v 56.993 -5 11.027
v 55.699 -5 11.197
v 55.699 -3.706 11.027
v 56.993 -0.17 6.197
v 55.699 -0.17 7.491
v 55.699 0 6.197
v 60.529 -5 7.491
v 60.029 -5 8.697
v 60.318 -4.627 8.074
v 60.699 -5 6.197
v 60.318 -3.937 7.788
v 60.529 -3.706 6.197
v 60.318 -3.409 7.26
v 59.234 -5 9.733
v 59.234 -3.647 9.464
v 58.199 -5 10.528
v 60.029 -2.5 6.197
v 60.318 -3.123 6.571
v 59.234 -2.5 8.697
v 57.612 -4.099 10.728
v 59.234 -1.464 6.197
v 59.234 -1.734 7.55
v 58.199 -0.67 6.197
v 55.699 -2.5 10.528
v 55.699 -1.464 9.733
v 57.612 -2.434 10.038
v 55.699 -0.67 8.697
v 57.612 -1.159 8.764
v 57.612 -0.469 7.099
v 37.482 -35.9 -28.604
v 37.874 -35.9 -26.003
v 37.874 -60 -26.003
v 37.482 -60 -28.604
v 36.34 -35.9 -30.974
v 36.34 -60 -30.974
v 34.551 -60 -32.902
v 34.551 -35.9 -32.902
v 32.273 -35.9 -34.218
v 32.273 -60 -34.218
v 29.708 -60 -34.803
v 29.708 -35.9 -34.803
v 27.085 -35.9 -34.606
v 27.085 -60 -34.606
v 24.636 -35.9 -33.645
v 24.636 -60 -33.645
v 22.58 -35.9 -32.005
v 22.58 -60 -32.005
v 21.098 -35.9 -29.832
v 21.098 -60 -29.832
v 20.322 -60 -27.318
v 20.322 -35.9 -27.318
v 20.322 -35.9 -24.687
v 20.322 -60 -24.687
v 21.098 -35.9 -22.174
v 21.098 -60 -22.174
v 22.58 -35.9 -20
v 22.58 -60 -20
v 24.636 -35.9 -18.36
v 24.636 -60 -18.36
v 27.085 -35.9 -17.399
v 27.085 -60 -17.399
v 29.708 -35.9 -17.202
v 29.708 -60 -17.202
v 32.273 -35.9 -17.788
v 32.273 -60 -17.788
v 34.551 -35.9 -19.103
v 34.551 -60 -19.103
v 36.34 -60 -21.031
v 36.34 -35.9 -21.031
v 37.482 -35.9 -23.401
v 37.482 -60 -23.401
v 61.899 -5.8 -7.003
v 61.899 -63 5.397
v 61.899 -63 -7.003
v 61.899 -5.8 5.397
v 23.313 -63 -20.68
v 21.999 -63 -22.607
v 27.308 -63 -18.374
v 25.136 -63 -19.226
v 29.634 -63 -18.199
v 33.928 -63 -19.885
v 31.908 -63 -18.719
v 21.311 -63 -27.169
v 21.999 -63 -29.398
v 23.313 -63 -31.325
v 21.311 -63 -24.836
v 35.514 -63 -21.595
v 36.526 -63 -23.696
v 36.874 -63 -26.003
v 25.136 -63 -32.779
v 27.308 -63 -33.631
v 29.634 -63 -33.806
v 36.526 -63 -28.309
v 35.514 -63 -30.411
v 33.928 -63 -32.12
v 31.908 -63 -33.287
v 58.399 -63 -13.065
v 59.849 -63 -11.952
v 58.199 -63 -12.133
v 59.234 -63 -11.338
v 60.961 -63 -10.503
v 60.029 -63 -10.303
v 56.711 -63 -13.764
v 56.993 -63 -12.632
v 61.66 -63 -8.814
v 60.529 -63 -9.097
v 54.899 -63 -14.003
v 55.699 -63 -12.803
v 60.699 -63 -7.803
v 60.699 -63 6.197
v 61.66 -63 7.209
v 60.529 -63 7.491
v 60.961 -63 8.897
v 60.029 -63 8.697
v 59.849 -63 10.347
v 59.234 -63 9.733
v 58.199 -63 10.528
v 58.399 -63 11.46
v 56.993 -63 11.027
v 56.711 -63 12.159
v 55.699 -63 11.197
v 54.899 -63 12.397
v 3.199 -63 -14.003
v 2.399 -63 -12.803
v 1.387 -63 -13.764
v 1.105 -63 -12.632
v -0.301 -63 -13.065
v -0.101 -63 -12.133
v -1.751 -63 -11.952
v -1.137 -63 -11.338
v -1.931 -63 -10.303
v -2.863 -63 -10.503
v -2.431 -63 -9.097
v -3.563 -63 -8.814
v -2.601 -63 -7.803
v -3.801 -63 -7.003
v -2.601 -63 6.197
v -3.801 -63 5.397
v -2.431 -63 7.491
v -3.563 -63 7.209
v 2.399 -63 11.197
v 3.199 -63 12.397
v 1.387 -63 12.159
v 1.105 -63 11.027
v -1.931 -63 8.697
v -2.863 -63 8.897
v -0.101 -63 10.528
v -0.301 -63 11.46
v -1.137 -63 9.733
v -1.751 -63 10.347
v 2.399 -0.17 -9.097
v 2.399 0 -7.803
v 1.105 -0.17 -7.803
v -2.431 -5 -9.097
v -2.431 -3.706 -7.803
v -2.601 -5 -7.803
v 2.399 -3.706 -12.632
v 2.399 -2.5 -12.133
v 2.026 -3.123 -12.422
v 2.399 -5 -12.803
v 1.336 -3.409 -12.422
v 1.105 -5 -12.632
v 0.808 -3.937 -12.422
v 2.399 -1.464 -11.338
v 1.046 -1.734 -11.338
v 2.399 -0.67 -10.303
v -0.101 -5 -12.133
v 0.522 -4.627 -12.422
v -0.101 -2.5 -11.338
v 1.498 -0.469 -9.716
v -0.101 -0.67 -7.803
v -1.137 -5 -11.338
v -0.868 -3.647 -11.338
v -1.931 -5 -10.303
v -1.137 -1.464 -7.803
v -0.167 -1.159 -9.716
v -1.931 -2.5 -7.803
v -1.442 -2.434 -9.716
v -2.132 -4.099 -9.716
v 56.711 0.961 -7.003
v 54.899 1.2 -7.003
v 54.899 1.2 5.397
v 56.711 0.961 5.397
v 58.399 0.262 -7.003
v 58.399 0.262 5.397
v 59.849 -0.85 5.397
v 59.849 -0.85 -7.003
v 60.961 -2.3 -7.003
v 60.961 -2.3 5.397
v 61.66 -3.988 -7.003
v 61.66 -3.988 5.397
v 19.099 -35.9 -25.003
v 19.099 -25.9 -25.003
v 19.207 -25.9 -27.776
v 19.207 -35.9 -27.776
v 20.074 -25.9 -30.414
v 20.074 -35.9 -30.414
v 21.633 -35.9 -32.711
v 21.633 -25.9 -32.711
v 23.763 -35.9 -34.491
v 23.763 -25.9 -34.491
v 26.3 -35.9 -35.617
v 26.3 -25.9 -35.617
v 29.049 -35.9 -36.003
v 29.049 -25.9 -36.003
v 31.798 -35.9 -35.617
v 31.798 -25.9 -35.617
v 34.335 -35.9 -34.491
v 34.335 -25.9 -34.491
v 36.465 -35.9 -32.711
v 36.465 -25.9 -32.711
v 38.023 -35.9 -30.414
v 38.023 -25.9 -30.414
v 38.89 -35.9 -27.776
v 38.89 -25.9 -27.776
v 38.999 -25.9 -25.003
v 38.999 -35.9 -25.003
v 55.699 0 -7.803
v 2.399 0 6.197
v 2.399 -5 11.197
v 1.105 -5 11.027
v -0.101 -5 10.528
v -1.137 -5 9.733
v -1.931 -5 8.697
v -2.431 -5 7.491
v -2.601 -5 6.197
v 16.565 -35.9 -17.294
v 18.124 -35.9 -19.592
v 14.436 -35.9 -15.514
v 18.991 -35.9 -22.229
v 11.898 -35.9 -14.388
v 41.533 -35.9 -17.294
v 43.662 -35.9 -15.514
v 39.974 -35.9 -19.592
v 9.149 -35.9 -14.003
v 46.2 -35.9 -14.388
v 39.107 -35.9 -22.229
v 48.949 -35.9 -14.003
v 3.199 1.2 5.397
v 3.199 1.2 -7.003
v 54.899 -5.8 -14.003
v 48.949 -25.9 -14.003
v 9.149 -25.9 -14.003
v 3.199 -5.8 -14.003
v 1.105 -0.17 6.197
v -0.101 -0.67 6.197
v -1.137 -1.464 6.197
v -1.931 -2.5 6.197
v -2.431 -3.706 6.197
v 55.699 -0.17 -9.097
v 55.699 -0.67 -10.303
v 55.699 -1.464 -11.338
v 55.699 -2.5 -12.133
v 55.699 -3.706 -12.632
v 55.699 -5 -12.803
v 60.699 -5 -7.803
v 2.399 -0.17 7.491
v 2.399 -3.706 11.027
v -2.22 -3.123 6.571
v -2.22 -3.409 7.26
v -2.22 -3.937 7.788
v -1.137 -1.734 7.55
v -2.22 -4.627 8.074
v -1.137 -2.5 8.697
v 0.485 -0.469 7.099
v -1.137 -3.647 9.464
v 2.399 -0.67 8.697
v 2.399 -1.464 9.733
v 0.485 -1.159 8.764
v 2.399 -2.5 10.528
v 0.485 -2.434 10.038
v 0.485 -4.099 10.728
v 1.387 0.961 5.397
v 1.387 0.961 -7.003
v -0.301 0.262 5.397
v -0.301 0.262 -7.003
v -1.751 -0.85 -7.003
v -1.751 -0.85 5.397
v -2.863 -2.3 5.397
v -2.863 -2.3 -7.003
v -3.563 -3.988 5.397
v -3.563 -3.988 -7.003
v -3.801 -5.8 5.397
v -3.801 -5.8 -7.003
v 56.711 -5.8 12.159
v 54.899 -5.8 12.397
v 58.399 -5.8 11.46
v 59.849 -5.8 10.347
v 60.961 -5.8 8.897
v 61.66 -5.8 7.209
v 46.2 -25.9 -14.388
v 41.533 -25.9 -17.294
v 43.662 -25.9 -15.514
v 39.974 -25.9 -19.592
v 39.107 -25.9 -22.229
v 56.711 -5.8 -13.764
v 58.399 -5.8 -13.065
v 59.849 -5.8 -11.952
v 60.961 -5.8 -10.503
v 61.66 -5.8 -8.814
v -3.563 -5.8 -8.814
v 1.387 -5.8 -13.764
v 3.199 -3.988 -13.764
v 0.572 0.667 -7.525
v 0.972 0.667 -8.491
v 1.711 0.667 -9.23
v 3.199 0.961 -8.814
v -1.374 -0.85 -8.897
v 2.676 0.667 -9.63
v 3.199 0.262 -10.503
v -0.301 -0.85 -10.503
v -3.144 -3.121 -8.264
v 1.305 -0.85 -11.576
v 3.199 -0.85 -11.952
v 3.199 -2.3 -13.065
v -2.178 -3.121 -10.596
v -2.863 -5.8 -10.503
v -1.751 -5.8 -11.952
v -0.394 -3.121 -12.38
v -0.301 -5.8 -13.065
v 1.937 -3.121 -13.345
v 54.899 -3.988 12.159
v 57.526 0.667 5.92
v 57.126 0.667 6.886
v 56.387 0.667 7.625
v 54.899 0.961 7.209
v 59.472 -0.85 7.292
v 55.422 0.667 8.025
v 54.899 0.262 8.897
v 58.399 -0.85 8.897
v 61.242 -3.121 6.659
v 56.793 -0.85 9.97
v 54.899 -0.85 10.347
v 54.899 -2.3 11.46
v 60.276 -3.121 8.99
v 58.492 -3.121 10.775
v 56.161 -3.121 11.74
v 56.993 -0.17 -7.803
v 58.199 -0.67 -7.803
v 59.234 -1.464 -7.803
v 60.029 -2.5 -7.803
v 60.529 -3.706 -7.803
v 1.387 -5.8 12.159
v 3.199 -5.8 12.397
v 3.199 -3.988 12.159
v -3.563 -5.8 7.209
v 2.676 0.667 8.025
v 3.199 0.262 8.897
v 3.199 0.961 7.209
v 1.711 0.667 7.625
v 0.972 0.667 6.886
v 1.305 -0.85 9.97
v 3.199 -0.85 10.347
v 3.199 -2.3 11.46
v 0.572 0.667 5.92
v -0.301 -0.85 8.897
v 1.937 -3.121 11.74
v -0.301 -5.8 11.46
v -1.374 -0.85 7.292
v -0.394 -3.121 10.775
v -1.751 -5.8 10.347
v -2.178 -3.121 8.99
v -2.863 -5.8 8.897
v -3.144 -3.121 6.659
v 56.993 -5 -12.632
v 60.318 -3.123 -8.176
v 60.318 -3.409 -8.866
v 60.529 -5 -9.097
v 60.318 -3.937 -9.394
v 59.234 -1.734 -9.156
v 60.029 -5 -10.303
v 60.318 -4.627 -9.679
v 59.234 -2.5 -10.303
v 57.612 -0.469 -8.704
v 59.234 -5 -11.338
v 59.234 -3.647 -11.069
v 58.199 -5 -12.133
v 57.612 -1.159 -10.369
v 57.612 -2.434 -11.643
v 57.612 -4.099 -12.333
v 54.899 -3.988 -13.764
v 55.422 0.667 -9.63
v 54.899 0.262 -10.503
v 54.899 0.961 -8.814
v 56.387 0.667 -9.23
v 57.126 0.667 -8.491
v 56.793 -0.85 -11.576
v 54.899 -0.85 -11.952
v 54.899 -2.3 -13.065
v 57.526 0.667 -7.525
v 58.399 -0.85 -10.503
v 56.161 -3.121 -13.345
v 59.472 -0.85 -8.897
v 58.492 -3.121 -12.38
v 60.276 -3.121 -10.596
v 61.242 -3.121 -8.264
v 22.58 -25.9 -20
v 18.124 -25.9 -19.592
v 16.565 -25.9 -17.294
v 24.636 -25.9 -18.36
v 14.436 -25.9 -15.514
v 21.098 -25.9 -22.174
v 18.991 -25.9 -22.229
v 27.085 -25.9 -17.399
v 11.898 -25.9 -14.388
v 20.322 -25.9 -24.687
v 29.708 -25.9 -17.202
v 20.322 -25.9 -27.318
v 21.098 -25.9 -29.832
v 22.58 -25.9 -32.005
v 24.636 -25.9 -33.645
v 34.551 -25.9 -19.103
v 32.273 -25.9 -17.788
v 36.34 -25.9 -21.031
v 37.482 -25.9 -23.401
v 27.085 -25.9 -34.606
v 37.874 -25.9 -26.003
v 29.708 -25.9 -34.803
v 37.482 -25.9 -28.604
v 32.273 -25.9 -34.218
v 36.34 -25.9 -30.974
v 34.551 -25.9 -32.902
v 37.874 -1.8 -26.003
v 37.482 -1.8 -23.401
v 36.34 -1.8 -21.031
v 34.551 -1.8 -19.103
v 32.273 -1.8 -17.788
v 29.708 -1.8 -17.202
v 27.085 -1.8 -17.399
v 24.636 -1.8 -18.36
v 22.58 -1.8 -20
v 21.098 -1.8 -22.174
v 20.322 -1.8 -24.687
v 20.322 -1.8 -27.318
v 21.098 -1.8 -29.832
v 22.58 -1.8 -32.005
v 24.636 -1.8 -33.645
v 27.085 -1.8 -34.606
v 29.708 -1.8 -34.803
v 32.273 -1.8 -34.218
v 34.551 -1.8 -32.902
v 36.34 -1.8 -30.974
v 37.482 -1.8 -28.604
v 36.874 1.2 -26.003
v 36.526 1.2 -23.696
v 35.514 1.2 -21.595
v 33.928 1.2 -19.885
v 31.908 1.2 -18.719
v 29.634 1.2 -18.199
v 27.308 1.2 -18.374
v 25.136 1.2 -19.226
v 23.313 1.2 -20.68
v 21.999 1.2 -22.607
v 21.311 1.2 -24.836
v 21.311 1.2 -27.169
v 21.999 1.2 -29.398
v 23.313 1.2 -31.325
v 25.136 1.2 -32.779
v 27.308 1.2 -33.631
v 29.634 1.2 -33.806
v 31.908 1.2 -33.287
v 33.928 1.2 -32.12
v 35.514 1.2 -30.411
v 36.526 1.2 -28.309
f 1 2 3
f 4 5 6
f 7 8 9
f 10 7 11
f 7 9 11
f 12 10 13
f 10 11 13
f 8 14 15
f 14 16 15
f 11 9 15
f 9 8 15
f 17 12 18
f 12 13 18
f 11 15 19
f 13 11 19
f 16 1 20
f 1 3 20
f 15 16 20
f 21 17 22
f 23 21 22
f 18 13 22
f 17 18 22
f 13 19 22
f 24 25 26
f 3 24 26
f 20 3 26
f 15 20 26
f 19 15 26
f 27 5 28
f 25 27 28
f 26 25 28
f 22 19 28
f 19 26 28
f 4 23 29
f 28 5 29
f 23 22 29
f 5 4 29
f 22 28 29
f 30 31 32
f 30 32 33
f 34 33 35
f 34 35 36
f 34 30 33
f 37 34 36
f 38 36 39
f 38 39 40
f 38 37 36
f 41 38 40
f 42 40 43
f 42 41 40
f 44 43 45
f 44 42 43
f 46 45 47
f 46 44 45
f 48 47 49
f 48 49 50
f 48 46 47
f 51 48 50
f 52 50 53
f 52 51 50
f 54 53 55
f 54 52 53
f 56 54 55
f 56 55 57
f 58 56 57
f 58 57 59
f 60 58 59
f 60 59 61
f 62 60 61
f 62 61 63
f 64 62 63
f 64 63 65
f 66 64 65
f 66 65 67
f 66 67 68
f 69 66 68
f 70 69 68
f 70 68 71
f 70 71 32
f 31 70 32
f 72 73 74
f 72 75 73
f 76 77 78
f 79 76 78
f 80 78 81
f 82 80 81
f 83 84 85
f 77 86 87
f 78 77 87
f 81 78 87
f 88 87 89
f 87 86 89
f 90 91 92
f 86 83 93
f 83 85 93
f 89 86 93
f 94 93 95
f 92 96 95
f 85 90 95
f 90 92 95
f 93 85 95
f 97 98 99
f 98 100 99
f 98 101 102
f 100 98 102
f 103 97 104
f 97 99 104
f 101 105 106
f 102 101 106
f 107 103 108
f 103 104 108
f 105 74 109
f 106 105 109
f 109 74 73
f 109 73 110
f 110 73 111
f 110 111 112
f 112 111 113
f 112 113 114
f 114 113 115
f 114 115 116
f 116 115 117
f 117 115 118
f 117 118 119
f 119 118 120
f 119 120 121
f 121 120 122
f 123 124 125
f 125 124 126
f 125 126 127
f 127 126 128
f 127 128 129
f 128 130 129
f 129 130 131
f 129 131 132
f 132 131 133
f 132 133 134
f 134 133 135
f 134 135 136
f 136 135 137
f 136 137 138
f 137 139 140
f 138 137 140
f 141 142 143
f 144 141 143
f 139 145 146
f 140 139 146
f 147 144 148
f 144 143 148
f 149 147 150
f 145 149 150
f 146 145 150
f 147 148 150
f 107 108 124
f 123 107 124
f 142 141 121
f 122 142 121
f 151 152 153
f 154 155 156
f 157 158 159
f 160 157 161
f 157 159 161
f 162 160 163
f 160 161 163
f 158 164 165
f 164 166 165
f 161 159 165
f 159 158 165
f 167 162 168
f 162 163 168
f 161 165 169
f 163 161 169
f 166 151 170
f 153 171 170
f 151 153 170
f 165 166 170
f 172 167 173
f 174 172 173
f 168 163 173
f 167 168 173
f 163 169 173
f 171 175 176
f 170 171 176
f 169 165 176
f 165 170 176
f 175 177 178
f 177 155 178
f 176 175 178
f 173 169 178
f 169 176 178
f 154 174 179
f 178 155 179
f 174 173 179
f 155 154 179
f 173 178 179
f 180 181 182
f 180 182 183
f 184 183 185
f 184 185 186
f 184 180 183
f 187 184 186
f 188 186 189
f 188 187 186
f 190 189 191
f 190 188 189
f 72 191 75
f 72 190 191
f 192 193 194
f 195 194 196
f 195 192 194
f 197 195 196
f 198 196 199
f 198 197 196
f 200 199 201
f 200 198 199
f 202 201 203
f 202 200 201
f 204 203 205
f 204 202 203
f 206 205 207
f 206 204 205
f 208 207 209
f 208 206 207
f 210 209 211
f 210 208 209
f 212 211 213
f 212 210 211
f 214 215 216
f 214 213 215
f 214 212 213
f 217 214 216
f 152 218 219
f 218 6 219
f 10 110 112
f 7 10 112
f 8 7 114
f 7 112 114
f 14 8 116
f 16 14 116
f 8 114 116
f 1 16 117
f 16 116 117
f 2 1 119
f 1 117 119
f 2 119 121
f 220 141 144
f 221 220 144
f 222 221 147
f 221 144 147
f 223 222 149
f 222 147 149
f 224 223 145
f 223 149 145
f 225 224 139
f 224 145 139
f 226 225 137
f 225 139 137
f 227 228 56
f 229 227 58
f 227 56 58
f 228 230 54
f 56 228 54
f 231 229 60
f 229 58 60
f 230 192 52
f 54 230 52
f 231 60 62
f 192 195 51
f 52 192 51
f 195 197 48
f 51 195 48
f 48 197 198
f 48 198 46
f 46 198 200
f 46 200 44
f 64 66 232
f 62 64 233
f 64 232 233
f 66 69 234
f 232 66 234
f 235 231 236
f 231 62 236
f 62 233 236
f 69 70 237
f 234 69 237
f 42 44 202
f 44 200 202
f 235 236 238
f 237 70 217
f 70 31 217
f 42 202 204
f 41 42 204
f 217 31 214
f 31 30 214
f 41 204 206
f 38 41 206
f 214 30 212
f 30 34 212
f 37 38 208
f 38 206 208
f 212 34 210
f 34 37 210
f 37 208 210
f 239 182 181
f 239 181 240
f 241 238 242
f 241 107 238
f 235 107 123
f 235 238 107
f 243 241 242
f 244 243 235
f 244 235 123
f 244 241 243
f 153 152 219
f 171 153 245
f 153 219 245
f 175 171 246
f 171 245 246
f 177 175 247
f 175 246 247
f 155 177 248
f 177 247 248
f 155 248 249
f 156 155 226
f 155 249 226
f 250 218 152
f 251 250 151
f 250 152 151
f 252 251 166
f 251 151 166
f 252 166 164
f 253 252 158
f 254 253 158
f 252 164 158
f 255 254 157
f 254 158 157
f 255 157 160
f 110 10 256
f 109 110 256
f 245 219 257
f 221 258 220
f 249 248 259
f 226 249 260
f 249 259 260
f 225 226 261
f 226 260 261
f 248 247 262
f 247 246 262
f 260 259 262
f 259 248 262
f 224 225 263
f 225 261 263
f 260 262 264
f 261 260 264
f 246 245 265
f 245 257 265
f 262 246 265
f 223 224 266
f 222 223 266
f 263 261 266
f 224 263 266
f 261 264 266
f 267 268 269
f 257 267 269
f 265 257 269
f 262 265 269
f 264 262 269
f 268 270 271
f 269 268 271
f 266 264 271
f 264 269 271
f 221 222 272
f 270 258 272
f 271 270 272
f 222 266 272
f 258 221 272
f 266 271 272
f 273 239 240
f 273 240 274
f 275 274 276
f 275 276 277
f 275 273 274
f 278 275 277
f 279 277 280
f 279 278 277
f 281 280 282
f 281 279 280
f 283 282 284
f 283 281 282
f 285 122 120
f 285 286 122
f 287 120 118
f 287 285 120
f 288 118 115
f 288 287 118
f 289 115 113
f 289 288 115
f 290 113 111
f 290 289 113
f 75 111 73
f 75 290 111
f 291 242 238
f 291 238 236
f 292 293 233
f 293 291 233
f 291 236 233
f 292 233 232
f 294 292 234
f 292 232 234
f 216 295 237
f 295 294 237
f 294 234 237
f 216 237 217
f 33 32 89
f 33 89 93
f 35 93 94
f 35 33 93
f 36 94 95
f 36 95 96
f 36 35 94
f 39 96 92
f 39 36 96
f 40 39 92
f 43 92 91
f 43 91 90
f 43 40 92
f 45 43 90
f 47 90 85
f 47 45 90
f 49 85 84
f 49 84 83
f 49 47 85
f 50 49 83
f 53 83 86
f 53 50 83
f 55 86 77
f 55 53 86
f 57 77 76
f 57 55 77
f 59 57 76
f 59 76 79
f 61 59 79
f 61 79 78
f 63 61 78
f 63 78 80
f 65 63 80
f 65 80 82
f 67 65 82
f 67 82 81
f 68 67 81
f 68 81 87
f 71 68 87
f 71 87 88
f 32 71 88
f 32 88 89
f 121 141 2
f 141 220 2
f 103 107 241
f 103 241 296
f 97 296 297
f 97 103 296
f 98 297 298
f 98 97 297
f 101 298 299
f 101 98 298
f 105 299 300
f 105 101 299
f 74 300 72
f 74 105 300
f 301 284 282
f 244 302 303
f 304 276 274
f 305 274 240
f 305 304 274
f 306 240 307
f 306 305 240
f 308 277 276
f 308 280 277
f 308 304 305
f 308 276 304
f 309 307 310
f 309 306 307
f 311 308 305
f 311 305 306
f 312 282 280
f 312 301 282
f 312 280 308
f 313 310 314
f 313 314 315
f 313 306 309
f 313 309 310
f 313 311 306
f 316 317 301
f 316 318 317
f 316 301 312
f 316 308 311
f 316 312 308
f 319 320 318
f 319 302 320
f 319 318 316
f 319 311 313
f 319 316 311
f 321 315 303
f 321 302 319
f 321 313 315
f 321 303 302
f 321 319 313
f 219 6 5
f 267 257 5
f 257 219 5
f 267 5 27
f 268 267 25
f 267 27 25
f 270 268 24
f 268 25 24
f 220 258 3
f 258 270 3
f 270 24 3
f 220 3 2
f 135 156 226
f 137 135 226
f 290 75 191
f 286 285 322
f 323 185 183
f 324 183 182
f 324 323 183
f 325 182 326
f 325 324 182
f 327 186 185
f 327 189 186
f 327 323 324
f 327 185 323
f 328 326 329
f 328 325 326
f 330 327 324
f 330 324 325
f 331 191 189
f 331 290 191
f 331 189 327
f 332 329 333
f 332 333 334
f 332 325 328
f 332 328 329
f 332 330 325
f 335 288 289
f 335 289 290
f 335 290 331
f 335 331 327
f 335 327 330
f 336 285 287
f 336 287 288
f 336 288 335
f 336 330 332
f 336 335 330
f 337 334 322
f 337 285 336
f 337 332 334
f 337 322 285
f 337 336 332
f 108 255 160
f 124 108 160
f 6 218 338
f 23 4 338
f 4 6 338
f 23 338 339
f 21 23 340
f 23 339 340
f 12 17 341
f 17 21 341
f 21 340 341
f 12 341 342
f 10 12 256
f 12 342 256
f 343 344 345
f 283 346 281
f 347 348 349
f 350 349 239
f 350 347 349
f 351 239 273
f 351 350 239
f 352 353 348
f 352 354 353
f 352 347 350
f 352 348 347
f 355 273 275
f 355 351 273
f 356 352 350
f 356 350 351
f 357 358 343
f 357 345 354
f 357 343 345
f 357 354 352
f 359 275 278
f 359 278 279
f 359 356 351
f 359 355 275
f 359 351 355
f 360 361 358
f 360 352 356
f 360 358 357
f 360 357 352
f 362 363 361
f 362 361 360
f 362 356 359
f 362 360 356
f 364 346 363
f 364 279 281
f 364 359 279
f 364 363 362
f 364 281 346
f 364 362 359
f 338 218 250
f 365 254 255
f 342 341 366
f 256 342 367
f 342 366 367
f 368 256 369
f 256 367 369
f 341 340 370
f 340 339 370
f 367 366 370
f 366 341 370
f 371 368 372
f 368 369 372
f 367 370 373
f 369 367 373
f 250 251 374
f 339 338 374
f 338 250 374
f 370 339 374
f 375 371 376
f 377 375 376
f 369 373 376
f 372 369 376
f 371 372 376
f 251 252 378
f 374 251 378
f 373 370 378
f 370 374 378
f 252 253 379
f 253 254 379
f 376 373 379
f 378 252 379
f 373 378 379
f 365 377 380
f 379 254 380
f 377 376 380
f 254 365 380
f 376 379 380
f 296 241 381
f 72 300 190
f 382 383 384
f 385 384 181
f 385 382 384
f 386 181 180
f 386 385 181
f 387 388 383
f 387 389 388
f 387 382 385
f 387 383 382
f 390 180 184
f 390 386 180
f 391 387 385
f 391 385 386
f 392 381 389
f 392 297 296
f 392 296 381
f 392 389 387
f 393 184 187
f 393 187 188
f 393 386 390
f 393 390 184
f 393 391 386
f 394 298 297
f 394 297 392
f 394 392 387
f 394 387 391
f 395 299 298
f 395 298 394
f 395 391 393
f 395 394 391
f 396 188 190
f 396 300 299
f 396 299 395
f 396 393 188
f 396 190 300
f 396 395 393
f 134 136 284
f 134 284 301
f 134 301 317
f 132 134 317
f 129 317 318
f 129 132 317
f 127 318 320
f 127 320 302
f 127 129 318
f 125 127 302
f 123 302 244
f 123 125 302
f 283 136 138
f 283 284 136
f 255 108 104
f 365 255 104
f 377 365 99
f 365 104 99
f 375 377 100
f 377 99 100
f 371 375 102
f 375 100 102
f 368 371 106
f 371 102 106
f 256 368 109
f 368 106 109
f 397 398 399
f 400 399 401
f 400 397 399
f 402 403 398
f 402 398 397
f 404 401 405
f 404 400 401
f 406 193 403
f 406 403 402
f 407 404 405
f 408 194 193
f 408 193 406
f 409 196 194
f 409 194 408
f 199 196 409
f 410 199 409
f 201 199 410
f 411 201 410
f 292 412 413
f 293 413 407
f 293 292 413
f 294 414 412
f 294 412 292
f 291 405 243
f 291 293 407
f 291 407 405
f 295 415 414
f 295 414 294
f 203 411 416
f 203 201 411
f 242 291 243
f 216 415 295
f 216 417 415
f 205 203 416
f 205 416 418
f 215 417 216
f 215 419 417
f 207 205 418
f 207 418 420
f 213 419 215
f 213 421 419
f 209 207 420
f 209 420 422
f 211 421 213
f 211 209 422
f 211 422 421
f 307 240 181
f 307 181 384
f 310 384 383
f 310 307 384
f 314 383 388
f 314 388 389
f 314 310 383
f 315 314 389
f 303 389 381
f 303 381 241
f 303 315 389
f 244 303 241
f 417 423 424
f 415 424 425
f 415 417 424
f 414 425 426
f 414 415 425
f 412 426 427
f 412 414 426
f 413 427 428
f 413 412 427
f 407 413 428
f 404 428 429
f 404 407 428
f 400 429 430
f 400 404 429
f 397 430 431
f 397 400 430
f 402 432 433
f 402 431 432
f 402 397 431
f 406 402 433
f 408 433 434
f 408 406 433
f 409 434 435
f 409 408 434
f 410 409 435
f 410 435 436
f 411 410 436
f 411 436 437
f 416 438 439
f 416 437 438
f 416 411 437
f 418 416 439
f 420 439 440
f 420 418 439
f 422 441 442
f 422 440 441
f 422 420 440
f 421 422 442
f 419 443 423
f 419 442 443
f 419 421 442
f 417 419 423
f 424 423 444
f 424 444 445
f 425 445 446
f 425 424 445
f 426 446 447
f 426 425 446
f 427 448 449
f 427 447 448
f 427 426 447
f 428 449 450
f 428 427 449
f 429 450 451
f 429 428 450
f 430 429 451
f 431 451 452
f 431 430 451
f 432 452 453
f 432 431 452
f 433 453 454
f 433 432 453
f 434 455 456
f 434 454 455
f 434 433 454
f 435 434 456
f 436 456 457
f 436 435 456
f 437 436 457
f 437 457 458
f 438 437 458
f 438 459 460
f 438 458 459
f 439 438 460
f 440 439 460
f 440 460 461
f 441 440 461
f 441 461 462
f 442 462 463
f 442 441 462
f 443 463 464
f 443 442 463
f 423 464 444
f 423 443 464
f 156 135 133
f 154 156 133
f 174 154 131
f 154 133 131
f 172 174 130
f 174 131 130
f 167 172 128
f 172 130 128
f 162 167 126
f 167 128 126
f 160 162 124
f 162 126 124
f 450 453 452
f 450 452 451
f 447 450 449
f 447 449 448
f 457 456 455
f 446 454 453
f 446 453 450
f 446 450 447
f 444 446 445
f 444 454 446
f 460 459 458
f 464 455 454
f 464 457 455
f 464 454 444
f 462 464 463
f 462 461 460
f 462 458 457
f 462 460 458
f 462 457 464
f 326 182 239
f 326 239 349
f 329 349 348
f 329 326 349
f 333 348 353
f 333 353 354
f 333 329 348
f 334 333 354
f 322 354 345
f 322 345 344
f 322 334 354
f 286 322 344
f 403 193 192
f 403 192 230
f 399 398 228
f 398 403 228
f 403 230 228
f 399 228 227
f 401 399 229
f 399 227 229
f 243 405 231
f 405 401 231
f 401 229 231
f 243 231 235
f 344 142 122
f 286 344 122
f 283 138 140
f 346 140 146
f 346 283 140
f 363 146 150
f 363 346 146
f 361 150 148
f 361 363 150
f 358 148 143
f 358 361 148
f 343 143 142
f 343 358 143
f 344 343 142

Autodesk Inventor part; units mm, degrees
ref_plane "YZ Plane" through (0, 0, 0) normal (1, 0, 0) x (0, 1, 0)
ref_plane "XZ Plane" through (0, 0, 0) normal (0, 1, 0) x (-1, 0, 0)
ref_plane "XY Plane" through (0, 0, 0) normal (0, 0, 1) x (1, 0, 0)
sketch "Sketch1" plane through (0, 0, 0) normal (0, 1, 0) x (-1, 0, 0)
  line L0 (3.8011, 12.3974) -> (-61.8989, 12.3974)
  line L1 (-61.8989, 12.3974) -> (-61.8989, -14.0026)
  line L2 (-61.8989, -14.0026) -> (3.8011, -14.0026)
  line L3 (3.8011, -14.0026) -> (3.8011, 12.3974)
  line L4 (2.6011, 11.1974) -> (-60.6989, 11.1974)
  line L5 (-60.6989, 11.1974) -> (-60.6989, -12.8026)
  line L6 (-60.6989, -12.8026) -> (2.6011, -12.8026)
  line L7 (2.6011, -12.8026) -> (2.6011, 11.1974)
  point P0 (0, 0)
  dimension "d0" = 26.4
  dimension "d1" = 65.7
  dimension "d2" = 1.2
  dimension "d3" = 24
  dimension "d4" = 63.3
extrude "Extrusion1" add sketch "Sketch1" along normal blind 1.2 contours L3 L2 L1 L0 | L7 L6 L5 L4
extrude "Extrusion2" add sketch "Sketch1" against normal blind 63
fillet "Fillet1" radius 5 8 edges at (29.0489, 0, 11.1974) (-2.6011, -31.5, 11.1974) (-2.6011, 0, -0.8026) (29.0489, 0, -12.8026) (60.6989, 0, -0.8026) (60.6989, -31.5, -12.8026) (-2.6011, -31.5, -12.8026) (60.6989, -31.5, 11.1974)
ref_plane "Work Plane1" through (0, -30.9, 0) normal (0, 1, 0) x (1, 0, 0)
sketch "Sketch3" plane through (0, -30.9, 0) normal (0, 1, 0) x (1, 0, 0)
  arc A0 (2.3989, 12.8026) -> (-2.6011, 7.8026) centre (2.3989, 7.8026) ccw projected
  line L0 (-2.6011, 7.8026) -> (-2.6011, -6.1974) projected
  arc A1 (-2.6011, -6.1974) -> (2.3989, -11.1974) centre (2.3989, -6.1974) ccw projected
  line L1 (2.3989, -11.1974) -> (55.6989, -11.1974) projected
  arc A2 (55.6989, -11.1974) -> (60.6989, -6.1974) centre (55.6989, -6.1974) ccw projected
  line L2 (60.6989, -6.1974) -> (60.6989, 7.8026) projected
  arc A3 (60.6989, 7.8026) -> (55.6989, 12.8026) centre (55.6989, 7.8026) ccw projected
  line L3 (55.6989, 12.8026) -> (2.3989, 12.8026) projected
  line L4 (61.8989, -12.3974) -> (-3.8011, -12.3974) projected
  line L5 (-3.8011, -12.3974) -> (-3.8011, 14.0026) projected
  line L6 (-3.8011, 14.0026) -> (61.8989, 14.0026) projected
  line L7 (61.8989, 14.0026) -> (61.8989, -12.3974) projected
  circle A4 centre (29.0489, 26.0026) radius 8.825
  circle A5 centre (29.0489, 26.0026) radius 10
  circle A6 centre (9.1492, 24.0026) radius 10
  circle A7 centre (48.9487, 24.0026) radius 10
  point P0 (0, 0)
  point P1 (29.0489, 14.0026)
  point P2 (48.9487, 14.0026)
  point P3 (38.9988, 25.0026)
  point P4 (19.099, 25.0026)
  point P5 (9.1492, 14.0026)
  dimension "d10" = 17.65
  dimension "d11" = 20
  dimension "d12" = 12
  dimension "d13" = 20
  dimension "d14" = 20
extrude "Extrusion3" add sketch "Sketch3" along normal mid plane 10 contours L6 A6 A5 A7 | A5 | A4
extrude "Extrusion4" add sketch "Sketch3" along normal mid plane 64.2 contours A4
chamfer "Chamfer1" distance 1 distance2 3 1 edges at (20.2239, -63, -26.0026) measured on face at (28.7756, -63, -23.412)
chamfer "Chamfer2" distance 1 distance2 3 1 edges at (20.2239, 1.2, -26.0026) measured on face at (28.7756, 1.2, -23.412)
fillet "Fillet2" radius 7 8 edges at (61.8989, -30.9, -14.0026) (61.8989, -30.9, 12.3974) (-3.8011, -30.9, 12.3974) (-3.8011, -30.9, -14.0026) (-3.8011, 1.2, -0.8026) (29.0489, 1.2, 12.3974) (61.8989, 1.2, -0.8026) (29.0489, 1.2, -14.0026)
properties part number "batteriehalter"
